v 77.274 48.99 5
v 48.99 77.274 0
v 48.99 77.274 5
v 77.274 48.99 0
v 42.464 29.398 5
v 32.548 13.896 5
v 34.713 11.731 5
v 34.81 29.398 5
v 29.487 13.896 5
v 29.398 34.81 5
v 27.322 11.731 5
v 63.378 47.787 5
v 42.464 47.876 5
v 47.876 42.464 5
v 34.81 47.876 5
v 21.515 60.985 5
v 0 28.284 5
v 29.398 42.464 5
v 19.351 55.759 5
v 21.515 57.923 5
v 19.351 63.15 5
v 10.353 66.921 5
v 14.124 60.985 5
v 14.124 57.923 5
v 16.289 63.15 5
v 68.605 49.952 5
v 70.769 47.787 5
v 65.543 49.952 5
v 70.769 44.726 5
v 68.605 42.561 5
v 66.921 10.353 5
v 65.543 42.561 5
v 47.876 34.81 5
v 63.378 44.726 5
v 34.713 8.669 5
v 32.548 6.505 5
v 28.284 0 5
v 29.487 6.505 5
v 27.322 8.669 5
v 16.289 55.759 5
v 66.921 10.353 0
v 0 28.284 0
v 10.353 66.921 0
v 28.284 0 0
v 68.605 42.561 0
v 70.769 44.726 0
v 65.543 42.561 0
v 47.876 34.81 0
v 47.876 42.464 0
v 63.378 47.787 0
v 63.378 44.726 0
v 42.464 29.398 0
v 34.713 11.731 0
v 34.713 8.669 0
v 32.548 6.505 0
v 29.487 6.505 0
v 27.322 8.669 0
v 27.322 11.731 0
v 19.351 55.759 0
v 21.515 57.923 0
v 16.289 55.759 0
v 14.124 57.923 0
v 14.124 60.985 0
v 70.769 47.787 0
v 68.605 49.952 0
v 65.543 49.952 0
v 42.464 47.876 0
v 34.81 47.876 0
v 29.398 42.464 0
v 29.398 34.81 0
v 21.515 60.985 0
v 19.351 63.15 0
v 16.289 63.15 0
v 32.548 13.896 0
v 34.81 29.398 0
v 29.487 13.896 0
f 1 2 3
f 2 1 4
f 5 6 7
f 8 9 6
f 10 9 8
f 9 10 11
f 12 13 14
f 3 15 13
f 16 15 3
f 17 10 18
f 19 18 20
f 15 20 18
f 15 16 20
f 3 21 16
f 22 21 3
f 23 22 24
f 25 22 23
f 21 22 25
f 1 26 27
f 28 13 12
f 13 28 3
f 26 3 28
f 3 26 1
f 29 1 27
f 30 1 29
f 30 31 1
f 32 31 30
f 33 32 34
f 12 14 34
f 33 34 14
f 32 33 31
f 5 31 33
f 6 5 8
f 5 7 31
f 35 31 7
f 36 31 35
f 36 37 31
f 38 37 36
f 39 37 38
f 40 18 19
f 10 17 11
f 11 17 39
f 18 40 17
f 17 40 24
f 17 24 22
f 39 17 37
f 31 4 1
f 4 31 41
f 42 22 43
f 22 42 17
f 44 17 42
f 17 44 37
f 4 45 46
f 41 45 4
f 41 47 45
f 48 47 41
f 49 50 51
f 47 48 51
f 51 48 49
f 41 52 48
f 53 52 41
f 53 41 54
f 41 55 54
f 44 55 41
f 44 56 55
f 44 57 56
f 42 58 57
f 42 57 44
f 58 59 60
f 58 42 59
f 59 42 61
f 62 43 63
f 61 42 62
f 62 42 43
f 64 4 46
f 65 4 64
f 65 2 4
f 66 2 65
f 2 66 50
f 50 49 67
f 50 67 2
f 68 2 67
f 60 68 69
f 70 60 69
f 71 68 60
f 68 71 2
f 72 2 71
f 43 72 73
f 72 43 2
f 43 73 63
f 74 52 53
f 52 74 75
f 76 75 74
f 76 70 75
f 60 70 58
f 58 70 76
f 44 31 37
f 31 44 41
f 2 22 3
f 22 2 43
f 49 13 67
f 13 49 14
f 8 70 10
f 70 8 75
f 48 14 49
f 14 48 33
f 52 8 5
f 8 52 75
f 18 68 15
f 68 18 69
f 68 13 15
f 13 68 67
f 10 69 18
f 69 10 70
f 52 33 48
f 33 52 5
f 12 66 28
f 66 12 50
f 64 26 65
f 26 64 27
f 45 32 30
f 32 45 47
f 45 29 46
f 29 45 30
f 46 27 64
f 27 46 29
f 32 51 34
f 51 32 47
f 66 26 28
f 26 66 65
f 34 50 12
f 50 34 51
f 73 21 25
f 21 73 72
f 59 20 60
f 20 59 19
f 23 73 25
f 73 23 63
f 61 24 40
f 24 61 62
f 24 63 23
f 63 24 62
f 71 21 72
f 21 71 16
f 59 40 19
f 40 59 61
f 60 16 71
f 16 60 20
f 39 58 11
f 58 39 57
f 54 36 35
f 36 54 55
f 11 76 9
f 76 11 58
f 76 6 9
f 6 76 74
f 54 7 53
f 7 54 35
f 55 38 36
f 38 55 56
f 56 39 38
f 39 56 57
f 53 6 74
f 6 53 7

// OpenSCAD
$fn = 32;

// ----------------------------------------------------------------------
// Polygon plate: 6-gon R40, 3 bolt windows
// ----------------------------------------------------------------------

// --- parameters (mm) ---
sides = 6;                // number of polygon sides
plate_r = 40;             // circumscribed radius of the polygon
bore_r = 10;              // centre bore radius
bolts = 3;                // number of bolt windows
ring_r = 29.44;           // bolt-circle radius
bolt_r = 4;               // bolt window radius
plate_t = 5;              // plate thickness, Z (extrusion height)

plate_d = 2 * plate_r;  // circumscribed diameter
bore_d = 2 * bore_r;  // centre bore diameter
bolt_d = 2 * bolt_r;  // bolt window diameter
ring_d = 2 * ring_r;  // bolt-circle diameter

profile = [[77.274, 48.99], [48.99, 77.274], [10.353, 66.921], [0, 28.284], [28.284, 0], [66.921, 10.353]];  // primary outline, 6 points, counter clockwise
void_1 = [[47.876, 42.464], [42.464, 47.876], [34.81, 47.876], [29.398, 42.464], [29.398, 34.81], [34.81, 29.398], [42.464, 29.398], [47.876, 34.81]];  // centre bore, 8 points
void_2 = [[70.769, 47.787], [68.605, 49.952], [65.543, 49.952], [63.378, 47.787], [63.378, 44.726], [65.543, 42.561], [68.605, 42.561], [70.769, 44.726]];  // bolt window 1, 8 points
void_3 = [[21.515, 60.985], [19.351, 63.15], [16.289, 63.15], [14.124, 60.985], [14.124, 57.923], [16.289, 55.759], [19.351, 55.759], [21.515, 57.923]];  // bolt window 2, 8 points
void_4 = [[34.713, 11.731], [32.548, 13.896], [29.487, 13.896], [27.322, 11.731], [27.322, 8.669], [29.487, 6.505], [32.548, 6.505], [34.713, 8.669]];  // bolt window 3, 8 points

// --- the one profile operation ---
difference() {
  linear_extrude(height = plate_t) polygon(points = profile);
  translate([0, 0, -1])
    linear_extrude(height = plate_t + 2) polygon(points = void_1);
  translate([0, 0, -1])
    linear_extrude(height = plate_t + 2) polygon(points = void_2);
  translate([0, 0, -1])
    linear_extrude(height = plate_t + 2) polygon(points = void_3);
  translate([0, 0, -1])
    linear_extrude(height = plate_t + 2) polygon(points = void_4);
}
